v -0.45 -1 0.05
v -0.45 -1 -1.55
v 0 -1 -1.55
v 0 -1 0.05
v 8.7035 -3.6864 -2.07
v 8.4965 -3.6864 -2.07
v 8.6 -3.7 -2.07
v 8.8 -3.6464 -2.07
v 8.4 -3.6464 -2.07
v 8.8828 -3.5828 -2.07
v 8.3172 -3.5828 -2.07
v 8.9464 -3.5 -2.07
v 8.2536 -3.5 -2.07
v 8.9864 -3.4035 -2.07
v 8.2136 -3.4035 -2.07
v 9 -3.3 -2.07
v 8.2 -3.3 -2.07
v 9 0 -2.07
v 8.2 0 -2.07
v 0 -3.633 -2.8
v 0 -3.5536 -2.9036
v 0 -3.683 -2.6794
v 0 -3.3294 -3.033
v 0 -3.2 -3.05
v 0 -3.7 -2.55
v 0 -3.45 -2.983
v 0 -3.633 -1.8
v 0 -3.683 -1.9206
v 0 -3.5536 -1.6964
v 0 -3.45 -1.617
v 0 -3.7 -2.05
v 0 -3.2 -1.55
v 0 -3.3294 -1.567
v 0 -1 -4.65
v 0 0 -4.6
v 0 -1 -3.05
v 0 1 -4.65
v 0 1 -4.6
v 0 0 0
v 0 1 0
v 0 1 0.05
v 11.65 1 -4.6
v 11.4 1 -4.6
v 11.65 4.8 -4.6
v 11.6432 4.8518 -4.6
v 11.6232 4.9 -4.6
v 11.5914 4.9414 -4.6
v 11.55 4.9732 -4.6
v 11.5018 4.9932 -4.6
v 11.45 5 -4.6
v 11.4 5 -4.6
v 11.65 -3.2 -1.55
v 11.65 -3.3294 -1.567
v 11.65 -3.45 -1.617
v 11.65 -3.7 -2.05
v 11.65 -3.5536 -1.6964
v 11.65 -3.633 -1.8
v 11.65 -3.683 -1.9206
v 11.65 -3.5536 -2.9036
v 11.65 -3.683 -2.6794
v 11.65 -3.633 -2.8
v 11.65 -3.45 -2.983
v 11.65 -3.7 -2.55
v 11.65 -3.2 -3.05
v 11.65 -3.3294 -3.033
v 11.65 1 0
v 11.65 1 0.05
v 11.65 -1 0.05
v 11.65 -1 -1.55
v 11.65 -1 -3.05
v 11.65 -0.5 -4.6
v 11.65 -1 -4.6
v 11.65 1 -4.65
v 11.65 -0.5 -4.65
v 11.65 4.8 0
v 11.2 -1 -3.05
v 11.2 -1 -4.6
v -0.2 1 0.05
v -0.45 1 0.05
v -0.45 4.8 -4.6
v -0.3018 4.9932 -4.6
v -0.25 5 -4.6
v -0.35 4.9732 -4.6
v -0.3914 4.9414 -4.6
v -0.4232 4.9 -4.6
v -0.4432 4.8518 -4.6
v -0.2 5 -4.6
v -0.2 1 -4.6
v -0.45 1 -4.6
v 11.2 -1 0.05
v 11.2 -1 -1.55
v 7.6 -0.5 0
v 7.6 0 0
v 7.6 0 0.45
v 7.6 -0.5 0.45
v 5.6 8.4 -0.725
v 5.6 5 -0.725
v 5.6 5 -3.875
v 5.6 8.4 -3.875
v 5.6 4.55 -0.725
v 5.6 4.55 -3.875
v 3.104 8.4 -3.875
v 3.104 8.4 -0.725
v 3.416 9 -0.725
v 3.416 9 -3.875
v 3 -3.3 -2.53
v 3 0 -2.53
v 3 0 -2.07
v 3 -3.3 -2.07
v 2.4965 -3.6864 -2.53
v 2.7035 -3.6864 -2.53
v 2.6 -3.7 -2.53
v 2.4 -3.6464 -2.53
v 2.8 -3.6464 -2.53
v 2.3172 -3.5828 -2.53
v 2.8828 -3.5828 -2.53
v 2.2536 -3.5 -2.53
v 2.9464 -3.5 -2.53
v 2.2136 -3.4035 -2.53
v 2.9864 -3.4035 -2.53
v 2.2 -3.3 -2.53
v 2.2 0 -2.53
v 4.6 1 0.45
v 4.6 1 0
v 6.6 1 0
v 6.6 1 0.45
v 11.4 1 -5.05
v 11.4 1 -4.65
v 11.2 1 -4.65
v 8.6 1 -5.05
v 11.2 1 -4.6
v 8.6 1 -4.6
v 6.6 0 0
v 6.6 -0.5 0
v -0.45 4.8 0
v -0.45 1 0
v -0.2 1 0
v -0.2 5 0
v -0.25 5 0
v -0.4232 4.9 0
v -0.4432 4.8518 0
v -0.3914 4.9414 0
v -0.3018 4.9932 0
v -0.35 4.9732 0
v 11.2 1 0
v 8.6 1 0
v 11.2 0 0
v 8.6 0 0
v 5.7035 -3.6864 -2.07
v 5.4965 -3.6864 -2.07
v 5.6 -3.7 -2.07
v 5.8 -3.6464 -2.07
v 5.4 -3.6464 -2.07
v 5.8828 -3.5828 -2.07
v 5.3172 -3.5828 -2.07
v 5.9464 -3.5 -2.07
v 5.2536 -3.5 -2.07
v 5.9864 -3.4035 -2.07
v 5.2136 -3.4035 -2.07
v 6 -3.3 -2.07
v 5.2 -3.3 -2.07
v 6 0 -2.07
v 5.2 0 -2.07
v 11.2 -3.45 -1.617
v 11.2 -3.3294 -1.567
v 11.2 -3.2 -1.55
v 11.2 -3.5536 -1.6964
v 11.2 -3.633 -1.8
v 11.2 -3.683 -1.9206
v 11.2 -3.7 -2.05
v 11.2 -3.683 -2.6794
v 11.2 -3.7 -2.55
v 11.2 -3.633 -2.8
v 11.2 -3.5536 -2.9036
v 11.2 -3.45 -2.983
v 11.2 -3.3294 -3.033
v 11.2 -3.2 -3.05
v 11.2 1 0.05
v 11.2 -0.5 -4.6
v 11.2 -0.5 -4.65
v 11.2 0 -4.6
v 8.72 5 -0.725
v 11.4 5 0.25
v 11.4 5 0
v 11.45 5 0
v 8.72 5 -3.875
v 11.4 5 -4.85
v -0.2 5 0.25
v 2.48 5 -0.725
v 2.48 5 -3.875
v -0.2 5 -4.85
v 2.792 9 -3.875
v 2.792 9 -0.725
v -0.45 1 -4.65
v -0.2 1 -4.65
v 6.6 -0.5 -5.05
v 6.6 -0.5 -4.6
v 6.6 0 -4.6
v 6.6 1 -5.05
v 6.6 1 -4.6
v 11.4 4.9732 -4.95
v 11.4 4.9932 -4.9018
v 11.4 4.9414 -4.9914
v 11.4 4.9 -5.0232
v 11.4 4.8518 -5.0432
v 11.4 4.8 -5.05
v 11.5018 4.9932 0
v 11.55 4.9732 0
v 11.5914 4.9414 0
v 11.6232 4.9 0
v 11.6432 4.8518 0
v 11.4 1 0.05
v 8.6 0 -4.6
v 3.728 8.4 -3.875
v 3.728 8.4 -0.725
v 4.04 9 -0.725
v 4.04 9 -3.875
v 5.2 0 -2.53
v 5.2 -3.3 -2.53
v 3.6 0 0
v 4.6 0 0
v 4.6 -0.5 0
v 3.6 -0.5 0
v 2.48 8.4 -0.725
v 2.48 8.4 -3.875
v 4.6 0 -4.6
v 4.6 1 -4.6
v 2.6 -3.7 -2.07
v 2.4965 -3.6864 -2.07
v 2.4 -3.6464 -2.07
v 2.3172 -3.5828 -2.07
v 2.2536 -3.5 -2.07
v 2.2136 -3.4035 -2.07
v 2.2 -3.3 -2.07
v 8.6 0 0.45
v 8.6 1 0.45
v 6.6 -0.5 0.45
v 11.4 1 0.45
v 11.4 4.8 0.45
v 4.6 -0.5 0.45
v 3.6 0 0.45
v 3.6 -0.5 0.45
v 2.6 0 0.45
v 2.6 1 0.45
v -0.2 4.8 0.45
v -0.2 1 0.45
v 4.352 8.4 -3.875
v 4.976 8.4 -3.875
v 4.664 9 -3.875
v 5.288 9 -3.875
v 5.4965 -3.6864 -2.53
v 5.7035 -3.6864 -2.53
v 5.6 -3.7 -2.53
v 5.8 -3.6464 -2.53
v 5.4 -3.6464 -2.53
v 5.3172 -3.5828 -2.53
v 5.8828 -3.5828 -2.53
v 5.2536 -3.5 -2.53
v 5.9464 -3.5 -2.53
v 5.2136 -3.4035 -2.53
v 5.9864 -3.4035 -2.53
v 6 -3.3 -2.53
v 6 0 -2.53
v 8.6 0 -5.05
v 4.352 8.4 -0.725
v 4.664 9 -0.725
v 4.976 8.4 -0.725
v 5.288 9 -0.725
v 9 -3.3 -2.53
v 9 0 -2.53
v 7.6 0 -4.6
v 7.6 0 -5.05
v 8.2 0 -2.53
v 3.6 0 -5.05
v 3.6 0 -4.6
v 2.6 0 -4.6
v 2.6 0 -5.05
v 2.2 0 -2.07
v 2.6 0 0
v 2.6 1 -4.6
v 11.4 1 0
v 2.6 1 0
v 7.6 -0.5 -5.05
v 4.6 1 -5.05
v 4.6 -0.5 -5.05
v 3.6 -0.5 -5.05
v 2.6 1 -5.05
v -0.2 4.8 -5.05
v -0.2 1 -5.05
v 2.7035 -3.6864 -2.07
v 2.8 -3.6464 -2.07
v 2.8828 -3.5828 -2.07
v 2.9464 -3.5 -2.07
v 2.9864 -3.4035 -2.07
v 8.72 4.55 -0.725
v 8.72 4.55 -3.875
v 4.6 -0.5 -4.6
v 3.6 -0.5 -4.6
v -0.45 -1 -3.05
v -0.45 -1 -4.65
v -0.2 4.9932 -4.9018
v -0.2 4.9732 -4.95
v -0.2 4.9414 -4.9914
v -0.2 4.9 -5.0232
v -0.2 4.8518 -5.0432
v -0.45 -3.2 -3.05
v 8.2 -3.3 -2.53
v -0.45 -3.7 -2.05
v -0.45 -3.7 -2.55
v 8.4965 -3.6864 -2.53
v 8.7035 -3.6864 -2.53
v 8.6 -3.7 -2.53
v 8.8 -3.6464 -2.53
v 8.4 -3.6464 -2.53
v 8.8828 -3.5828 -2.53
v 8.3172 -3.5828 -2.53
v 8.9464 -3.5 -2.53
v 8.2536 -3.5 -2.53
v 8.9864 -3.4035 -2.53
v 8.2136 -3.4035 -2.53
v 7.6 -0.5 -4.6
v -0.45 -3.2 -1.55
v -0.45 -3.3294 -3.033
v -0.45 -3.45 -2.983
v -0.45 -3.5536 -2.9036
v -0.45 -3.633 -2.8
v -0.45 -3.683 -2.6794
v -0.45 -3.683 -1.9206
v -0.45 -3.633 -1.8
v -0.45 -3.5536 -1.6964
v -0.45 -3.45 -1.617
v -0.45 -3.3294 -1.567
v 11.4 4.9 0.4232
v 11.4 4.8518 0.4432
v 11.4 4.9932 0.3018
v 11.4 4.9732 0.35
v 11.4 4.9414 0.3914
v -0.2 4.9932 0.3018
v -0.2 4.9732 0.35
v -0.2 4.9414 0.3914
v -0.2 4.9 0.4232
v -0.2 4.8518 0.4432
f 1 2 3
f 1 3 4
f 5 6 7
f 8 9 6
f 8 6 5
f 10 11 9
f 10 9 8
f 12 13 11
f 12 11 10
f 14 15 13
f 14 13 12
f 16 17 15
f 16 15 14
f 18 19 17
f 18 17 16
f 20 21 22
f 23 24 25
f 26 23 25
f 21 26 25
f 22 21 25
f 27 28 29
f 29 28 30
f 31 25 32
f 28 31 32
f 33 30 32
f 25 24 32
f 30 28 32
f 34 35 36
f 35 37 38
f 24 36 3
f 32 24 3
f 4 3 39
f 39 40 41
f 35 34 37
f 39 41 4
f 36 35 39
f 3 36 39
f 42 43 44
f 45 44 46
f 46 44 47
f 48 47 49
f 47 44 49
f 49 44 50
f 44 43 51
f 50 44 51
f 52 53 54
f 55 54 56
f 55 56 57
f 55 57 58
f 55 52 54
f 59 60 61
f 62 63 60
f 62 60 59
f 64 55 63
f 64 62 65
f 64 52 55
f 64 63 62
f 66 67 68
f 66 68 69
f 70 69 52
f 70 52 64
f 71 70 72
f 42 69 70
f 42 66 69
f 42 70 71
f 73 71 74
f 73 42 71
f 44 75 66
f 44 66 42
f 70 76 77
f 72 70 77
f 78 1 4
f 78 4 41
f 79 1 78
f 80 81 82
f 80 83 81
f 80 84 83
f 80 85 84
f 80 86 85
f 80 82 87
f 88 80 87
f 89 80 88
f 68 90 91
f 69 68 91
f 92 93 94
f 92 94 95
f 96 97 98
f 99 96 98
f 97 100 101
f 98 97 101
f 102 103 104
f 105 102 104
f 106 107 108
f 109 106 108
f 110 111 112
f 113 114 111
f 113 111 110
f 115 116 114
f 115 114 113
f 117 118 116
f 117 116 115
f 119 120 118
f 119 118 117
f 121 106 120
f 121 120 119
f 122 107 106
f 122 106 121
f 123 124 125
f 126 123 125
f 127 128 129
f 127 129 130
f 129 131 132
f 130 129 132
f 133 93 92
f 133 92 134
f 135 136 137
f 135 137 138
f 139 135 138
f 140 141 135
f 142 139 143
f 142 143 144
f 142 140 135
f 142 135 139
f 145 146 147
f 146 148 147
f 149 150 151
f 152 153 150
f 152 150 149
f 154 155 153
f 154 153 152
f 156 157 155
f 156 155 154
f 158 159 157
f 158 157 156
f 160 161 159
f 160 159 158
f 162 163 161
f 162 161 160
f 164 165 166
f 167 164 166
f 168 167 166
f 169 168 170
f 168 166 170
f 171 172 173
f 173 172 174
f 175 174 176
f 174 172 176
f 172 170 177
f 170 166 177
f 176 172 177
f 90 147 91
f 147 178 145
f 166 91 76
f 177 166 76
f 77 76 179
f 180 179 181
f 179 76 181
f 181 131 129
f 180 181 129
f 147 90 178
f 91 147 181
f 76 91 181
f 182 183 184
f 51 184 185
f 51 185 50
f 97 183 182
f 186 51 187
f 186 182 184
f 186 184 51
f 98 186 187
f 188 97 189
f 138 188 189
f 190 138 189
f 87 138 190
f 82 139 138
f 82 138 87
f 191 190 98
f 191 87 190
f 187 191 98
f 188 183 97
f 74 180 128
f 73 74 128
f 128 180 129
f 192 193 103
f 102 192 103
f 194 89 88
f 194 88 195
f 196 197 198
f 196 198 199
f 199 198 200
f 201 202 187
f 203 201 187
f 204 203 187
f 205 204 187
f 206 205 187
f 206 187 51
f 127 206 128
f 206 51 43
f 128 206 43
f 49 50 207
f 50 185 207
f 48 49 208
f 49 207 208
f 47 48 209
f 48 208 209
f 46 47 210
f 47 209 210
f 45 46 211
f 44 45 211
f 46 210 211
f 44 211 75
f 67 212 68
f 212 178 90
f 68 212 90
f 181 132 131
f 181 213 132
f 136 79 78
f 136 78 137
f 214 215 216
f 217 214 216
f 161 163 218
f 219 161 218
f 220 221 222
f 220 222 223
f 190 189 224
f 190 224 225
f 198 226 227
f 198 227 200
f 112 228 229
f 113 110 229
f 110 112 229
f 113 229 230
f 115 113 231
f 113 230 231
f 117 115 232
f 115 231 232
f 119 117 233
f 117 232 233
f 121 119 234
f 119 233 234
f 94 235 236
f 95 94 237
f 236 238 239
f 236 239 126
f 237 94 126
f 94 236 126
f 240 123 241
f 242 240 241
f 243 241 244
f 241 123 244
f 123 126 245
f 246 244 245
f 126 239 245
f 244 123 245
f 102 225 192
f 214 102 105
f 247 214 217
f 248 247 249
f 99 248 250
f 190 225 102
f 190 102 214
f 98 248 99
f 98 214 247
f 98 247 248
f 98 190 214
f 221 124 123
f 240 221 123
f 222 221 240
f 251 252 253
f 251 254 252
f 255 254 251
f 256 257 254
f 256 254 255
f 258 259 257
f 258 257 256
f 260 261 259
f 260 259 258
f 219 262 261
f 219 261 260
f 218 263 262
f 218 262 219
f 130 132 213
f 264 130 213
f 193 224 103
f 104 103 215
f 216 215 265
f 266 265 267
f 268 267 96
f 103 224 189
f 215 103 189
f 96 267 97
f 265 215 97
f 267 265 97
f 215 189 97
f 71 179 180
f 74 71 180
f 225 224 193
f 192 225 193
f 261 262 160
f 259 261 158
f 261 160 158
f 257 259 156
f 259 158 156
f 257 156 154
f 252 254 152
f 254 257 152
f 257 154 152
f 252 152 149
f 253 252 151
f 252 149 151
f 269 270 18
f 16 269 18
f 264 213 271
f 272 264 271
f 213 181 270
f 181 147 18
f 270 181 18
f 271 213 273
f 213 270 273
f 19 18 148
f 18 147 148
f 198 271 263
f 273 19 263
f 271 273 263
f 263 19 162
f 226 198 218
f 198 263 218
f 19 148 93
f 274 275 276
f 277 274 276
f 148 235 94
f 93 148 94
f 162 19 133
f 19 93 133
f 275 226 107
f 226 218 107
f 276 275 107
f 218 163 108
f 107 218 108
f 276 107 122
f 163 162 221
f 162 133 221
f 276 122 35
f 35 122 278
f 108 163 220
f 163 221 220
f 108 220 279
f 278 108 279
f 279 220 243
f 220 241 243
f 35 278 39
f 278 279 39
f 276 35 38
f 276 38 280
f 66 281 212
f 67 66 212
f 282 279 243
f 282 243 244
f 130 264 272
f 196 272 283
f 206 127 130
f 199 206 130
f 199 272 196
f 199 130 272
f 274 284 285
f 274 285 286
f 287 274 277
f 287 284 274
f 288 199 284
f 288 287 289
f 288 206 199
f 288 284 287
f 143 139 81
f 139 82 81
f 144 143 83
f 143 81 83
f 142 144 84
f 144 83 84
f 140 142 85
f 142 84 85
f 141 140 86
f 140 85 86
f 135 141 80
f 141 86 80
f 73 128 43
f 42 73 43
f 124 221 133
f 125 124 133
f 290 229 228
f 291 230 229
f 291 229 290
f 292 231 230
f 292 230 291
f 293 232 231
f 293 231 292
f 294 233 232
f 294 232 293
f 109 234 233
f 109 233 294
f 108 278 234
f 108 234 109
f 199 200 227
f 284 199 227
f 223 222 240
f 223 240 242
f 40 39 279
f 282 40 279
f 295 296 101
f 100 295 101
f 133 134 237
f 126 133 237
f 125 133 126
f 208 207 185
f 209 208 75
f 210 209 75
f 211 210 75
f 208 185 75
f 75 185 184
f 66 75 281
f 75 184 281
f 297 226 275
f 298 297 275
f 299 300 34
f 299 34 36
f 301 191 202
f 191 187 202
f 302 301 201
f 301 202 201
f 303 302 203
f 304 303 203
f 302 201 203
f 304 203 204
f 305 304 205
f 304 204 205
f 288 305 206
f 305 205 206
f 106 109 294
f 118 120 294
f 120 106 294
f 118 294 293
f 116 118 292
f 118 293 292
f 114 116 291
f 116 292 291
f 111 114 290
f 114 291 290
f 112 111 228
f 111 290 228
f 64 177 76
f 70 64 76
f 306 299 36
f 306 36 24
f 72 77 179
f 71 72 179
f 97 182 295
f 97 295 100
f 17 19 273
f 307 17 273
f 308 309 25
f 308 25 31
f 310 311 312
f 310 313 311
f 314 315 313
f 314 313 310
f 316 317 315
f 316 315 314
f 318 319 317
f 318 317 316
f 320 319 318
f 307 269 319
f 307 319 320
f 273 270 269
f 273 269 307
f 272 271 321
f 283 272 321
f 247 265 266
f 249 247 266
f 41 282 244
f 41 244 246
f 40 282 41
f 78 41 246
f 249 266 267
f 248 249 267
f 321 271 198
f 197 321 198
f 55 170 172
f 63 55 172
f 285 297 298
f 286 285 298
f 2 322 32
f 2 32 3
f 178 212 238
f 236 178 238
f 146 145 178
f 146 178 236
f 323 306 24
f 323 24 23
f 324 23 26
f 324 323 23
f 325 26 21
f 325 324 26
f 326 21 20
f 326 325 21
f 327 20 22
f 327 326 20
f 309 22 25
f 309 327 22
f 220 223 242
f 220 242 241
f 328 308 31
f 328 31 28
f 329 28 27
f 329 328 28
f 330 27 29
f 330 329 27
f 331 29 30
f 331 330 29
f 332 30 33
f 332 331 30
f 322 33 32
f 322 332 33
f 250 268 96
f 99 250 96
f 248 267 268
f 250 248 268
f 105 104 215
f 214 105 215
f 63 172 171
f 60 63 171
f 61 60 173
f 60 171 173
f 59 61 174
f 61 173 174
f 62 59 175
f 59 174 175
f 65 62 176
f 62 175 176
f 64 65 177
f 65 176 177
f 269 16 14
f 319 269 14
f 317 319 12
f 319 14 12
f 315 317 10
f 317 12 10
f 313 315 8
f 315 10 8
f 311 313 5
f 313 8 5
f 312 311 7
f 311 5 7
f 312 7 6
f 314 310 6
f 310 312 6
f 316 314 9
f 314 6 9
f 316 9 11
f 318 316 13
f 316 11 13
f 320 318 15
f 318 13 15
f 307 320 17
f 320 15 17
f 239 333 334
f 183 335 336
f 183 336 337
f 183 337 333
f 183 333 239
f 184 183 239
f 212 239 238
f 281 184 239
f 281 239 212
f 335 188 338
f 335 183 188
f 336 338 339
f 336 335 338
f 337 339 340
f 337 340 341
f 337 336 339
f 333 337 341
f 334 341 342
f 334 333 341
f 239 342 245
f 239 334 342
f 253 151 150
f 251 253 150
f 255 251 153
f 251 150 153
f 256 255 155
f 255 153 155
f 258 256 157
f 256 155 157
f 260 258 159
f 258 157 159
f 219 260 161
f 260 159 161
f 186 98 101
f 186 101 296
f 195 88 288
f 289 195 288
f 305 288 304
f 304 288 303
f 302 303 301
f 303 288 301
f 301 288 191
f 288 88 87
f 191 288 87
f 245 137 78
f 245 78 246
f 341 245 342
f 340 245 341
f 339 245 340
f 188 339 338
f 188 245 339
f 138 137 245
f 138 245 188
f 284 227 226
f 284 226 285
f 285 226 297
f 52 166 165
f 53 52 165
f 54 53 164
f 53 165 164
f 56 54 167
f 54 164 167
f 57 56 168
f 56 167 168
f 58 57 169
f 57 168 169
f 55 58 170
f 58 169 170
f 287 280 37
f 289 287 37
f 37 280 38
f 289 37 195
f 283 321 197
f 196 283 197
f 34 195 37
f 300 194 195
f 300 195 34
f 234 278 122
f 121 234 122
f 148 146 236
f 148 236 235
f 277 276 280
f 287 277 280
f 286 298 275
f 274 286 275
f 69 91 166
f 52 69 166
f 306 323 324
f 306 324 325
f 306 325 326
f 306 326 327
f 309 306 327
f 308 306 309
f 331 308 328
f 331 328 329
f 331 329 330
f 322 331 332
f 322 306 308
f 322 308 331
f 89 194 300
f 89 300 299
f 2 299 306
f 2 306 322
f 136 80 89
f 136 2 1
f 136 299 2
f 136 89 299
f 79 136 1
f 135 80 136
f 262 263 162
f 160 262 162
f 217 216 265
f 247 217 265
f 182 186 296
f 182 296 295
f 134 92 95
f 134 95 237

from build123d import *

# Parameters (mm, degrees)
SKETCH_1_W          = 11.2
SKETCH_1_H          = 4.6
EXTRUDE_1_DEPTH     = 5
EXTRUDE_2_DEPTH     = 0.45
EXTRUDE_3_DEPTH     = 0.45
EXTRUDE_4_DEPTH     = 0.45
EXTRUDE_START       = 0.45
EXTRUDE_5_DEPTH     = 0.45
CUT_EXTRUDE_1_DEPTH = 0.45
SKETCH_7_W          = 3.12
SKETCH_7_H          = 3.15
EXTRUDE_6_DEPTH     = 4.45
CUT_EXTRUDE_2_DEPTH = 4.45
EXTRUDE_7_DEPTH     = 3.7
CUT_EXTRUDE_3_DEPTH = 3.7
FILLET_1_R          = 0.2
FILLET_2_R          = 0.2
FILLET_3_R          = 0.2
FILLET_4_R          = 0.2


with BuildPart() as part:
    # 草图1 → 凸台-拉伸1 (new body)
    with BuildSketch(Plane(origin=(0, 0, 0), x_dir=(1, 0, 0), z_dir=(0, 1, 0))):
        with Locations((5.6, 2.3)):
            Rectangle(SKETCH_1_W, SKETCH_1_H)
    extrude(amount=EXTRUDE_1_DEPTH)

    # 草图2 → 凸台-拉伸2 (add)
    with BuildSketch(Plane.XY):
        Polygon((11.4, 5), (11.4, 1), (8.6, 1), (8.6, 0), (7.6, 0), (7.6, -0.5), (6.6, -0.5), (6.6, 1), (5.6, 1), (4.6, 1), (4.6, -0.5), (3.6, -0.5), (3.6, 0), (2.6, 0), (2.6, 1), (-0.2, 1), (-0.2, 5), align=None)
    extrude(amount=EXTRUDE_2_DEPTH)

    # 草图3 → 凸台-拉伸3 (add)
    with BuildSketch(Plane(origin=(0, 0, -4.6), x_dir=(-1, 0, 0), z_dir=(0, 0, -1))):
        Polygon((-5.6, 5), (-11.4, 5), (-11.4, 1), (-8.6, 1), (-8.6, 0), (-7.6, 0), (-7.6, -0.5), (-6.6, -0.5), (-6.6, 1), (-4.6, 1), (-4.6, -0.5), (-3.6, -0.5), (-3.6, 0), (-2.6, 0), (-2.6, 1), (0.2, 1), (0.2, 5), align=None)
    extrude(amount=EXTRUDE_3_DEPTH)

    # 草图4 → 凸台-拉伸4 (add)
    with BuildSketch(Plane(origin=(11.2, 0, 0), x_dir=(0, 0, -1), z_dir=(1, 0, 0))):
        with BuildLine():
            Line((0, 5), (0, 1))
            Line((0, 1), (-0.05, 1))
            Line((-0.05, 1), (-0.05, -1))
            Line((-0.05, -1), (0, -1))
            Line((0, -1), (1.55, -1))
            Line((1.55, -1), (1.55, -3.2))
            ThreePointArc((1.55, -3.2), (1.696446609, -3.553553391), (2.05, -3.7))
            Line((2.05, -3.7), (2.3, -3.7))
            Line((2.3, -3.7), (2.55, -3.7))
            ThreePointArc((2.55, -3.7), (2.903553391, -3.553553391), (3.05, -3.2))
            Line((3.05, -3.2), (3.05, -1))
            Line((3.05, -1), (4.6, -1))
            Line((4.6, -1), (4.6, -0.5))
            Line((4.6, -0.5), (4.65, -0.5))
            Line((4.65, -0.5), (4.65, 1))
            Line((4.65, 1), (4.6, 1))
            Line((4.6, 1), (4.6, 5))
            Line((4.6, 5), (0, 5))
        make_face()
    extrude(amount=EXTRUDE_4_DEPTH)

    # 草图5 → 凸台-拉伸5 (add)
    with BuildSketch(Plane.ZY.offset(EXTRUDE_START)):
        with BuildLine():
            Line((-4.6, 5), (-4.6, 1))
            Line((-4.6, 1), (-4.65, 1))
            Line((-4.65, 1), (-4.65, -1))
            Line((-4.65, -1), (-4.6, -1))
            Line((-4.6, -1), (-3.05, -1))
            Line((-3.05, -1), (-3.05, -3.2))
            ThreePointArc((-3.05, -3.2), (-2.903553391, -3.553553391), (-2.55, -3.7))
            Line((-2.55, -3.7), (-2.05, -3.7))
            ThreePointArc((-2.05, -3.7), (-1.696446609, -3.553553391), (-1.55, -3.2))
            Line((-1.55, -3.2), (-1.55, -1))
            Line((-1.55, -1), (0.05, -1))
            Line((0.05, -1), (0.05, 1))
            Line((0.05, 1), (0, 1))
            Line((0, 1), (0, 5))
            Line((0, 5), (-4.6, 5))
        make_face()
    extrude(amount=-EXTRUDE_5_DEPTH)

    # 草图6 → 切除-拉伸1 (cut)
    with BuildSketch(Plane(origin=(0, 5, 0), x_dir=(1, 0, 0), z_dir=(0, 1, 0))):
        Polygon((2.48, 2.3), (2.48, 3.875), (8.72, 3.875), (8.72, 0.725), (2.48, 0.725), align=None)
    extrude(amount=-CUT_EXTRUDE_1_DEPTH, mode=Mode.SUBTRACT)

    # 草图7 → 凸台-拉伸6 (add)
    with BuildSketch(Plane(origin=(0, 4.55, 0), x_dir=(1, 0, 0), z_dir=(0, 1, 0))):
        with Locations((4.04, 2.3)):
            Rectangle(SKETCH_7_W, SKETCH_7_H)
    extrude(amount=EXTRUDE_6_DEPTH)

    # 草图8 → 切除-拉伸2 (cut)
    with BuildSketch(Plane.XY.offset(-0.725)):
        Polygon((2.48, 8.4), (2.792, 9), (2.48, 9), align=None)
        Polygon((3.104, 8.4), (3.416, 9), (2.792, 9), align=None)
        Polygon((3.728, 8.4), (4.04, 9), (3.416, 9), align=None)
        Polygon((4.352, 8.4), (4.664, 9), (4.04, 9), align=None)
        Polygon((5.288, 9), (4.664, 9), (4.976, 8.4), align=None)
        Polygon((5.6, 9), (5.288, 9), (5.6, 8.4), align=None)
    extrude(amount=-CUT_EXTRUDE_2_DEPTH, mode=Mode.SUBTRACT)

    # 草图9 → 凸台-拉伸7 (add)
    with BuildSketch(Plane.XZ):
        Polygon((8.2, -2.3), (8.2, -2.07), (9, -2.07), (9, -2.3), (9, -2.53), (8.2, -2.53), align=None)
        Polygon((5.2, -2.3), (5.2, -2.07), (6, -2.07), (6, -2.3), (6, -2.53), (5.2, -2.53), align=None)
        Polygon((2.2, -2.3), (2.2, -2.07), (3, -2.07), (3, -2.3), (3, -2.53), (2.2, -2.53), align=None)
    extrude(amount=EXTRUDE_7_DEPTH)

    # 草图10 → 切除-拉伸3 (cut)
    with BuildSketch(Plane.XY.offset(-2.07)):
        with BuildLine():
            ThreePointArc((2.6, -3.7), (2.317157288, -3.582842712), (2.2, -3.3))
            Line((2.2, -3.3), (2.2, -3.7))
            Line((2.2, -3.7), (2.6, -3.7))
        make_face()
        with BuildLine():
            ThreePointArc((3, -3.3), (2.882842712, -3.582842712), (2.6, -3.7))
            Line((2.6, -3.7), (3, -3.7))
            Line((3, -3.7), (3, -3.3))
        make_face()
        with BuildLine():
            Line((3, -3.3), (3, -3.7))
            Line((3, -3.7), (5.6, -3.7))
            ThreePointArc((5.6, -3.7), (5.317157288, -3.582842712), (5.2, -3.3))
            Line((5.2, -3.3), (3, -3.3))
        make_face()
        with BuildLine():
            ThreePointArc((6, -3.3), (5.882842712, -3.582842712), (5.6, -3.7))
            Line((5.6, -3.7), (8.6, -3.7))
            ThreePointArc((8.6, -3.7), (8.317157288, -3.582842712), (8.2, -3.3))
            Line((8.2, -3.3), (6, -3.3))
        make_face()
        with BuildLine():
            ThreePointArc((9, -3.3), (8.882842712, -3.582842712), (8.6, -3.7))
            Line((8.6, -3.7), (9, -3.7))
            Line((9, -3.7), (9, -3.3))
        make_face()
    extrude(amount=-CUT_EXTRUDE_3_DEPTH, mode=Mode.SUBTRACT)

    # 圆角1
    fillet_1_edges = [part.edges().sort_by_distance(p)[0] for p in [
        (-0.45, 5, -2.3),
    ]]
    fillet(fillet_1_edges, radius=FILLET_1_R)

    # 圆角2
    fillet_2_edges = [part.edges().sort_by_distance(p)[0] for p in [
        (5.6, 5, 0.45),
    ]]
    fillet(fillet_2_edges, radius=FILLET_2_R)

    # 圆角3
    fillet_3_edges = [part.edges().sort_by_distance(p)[0] for p in [
        (11.65, 5, -2.3),
    ]]
    fillet(fillet_3_edges, radius=FILLET_3_R)

    # 圆角4
    fillet_4_edges = [part.edges().sort_by_distance(p)[0] for p in [
        (5.6, 5, -5.05),
    ]]
    fillet(fillet_4_edges, radius=FILLET_4_R)


solid = part.part
